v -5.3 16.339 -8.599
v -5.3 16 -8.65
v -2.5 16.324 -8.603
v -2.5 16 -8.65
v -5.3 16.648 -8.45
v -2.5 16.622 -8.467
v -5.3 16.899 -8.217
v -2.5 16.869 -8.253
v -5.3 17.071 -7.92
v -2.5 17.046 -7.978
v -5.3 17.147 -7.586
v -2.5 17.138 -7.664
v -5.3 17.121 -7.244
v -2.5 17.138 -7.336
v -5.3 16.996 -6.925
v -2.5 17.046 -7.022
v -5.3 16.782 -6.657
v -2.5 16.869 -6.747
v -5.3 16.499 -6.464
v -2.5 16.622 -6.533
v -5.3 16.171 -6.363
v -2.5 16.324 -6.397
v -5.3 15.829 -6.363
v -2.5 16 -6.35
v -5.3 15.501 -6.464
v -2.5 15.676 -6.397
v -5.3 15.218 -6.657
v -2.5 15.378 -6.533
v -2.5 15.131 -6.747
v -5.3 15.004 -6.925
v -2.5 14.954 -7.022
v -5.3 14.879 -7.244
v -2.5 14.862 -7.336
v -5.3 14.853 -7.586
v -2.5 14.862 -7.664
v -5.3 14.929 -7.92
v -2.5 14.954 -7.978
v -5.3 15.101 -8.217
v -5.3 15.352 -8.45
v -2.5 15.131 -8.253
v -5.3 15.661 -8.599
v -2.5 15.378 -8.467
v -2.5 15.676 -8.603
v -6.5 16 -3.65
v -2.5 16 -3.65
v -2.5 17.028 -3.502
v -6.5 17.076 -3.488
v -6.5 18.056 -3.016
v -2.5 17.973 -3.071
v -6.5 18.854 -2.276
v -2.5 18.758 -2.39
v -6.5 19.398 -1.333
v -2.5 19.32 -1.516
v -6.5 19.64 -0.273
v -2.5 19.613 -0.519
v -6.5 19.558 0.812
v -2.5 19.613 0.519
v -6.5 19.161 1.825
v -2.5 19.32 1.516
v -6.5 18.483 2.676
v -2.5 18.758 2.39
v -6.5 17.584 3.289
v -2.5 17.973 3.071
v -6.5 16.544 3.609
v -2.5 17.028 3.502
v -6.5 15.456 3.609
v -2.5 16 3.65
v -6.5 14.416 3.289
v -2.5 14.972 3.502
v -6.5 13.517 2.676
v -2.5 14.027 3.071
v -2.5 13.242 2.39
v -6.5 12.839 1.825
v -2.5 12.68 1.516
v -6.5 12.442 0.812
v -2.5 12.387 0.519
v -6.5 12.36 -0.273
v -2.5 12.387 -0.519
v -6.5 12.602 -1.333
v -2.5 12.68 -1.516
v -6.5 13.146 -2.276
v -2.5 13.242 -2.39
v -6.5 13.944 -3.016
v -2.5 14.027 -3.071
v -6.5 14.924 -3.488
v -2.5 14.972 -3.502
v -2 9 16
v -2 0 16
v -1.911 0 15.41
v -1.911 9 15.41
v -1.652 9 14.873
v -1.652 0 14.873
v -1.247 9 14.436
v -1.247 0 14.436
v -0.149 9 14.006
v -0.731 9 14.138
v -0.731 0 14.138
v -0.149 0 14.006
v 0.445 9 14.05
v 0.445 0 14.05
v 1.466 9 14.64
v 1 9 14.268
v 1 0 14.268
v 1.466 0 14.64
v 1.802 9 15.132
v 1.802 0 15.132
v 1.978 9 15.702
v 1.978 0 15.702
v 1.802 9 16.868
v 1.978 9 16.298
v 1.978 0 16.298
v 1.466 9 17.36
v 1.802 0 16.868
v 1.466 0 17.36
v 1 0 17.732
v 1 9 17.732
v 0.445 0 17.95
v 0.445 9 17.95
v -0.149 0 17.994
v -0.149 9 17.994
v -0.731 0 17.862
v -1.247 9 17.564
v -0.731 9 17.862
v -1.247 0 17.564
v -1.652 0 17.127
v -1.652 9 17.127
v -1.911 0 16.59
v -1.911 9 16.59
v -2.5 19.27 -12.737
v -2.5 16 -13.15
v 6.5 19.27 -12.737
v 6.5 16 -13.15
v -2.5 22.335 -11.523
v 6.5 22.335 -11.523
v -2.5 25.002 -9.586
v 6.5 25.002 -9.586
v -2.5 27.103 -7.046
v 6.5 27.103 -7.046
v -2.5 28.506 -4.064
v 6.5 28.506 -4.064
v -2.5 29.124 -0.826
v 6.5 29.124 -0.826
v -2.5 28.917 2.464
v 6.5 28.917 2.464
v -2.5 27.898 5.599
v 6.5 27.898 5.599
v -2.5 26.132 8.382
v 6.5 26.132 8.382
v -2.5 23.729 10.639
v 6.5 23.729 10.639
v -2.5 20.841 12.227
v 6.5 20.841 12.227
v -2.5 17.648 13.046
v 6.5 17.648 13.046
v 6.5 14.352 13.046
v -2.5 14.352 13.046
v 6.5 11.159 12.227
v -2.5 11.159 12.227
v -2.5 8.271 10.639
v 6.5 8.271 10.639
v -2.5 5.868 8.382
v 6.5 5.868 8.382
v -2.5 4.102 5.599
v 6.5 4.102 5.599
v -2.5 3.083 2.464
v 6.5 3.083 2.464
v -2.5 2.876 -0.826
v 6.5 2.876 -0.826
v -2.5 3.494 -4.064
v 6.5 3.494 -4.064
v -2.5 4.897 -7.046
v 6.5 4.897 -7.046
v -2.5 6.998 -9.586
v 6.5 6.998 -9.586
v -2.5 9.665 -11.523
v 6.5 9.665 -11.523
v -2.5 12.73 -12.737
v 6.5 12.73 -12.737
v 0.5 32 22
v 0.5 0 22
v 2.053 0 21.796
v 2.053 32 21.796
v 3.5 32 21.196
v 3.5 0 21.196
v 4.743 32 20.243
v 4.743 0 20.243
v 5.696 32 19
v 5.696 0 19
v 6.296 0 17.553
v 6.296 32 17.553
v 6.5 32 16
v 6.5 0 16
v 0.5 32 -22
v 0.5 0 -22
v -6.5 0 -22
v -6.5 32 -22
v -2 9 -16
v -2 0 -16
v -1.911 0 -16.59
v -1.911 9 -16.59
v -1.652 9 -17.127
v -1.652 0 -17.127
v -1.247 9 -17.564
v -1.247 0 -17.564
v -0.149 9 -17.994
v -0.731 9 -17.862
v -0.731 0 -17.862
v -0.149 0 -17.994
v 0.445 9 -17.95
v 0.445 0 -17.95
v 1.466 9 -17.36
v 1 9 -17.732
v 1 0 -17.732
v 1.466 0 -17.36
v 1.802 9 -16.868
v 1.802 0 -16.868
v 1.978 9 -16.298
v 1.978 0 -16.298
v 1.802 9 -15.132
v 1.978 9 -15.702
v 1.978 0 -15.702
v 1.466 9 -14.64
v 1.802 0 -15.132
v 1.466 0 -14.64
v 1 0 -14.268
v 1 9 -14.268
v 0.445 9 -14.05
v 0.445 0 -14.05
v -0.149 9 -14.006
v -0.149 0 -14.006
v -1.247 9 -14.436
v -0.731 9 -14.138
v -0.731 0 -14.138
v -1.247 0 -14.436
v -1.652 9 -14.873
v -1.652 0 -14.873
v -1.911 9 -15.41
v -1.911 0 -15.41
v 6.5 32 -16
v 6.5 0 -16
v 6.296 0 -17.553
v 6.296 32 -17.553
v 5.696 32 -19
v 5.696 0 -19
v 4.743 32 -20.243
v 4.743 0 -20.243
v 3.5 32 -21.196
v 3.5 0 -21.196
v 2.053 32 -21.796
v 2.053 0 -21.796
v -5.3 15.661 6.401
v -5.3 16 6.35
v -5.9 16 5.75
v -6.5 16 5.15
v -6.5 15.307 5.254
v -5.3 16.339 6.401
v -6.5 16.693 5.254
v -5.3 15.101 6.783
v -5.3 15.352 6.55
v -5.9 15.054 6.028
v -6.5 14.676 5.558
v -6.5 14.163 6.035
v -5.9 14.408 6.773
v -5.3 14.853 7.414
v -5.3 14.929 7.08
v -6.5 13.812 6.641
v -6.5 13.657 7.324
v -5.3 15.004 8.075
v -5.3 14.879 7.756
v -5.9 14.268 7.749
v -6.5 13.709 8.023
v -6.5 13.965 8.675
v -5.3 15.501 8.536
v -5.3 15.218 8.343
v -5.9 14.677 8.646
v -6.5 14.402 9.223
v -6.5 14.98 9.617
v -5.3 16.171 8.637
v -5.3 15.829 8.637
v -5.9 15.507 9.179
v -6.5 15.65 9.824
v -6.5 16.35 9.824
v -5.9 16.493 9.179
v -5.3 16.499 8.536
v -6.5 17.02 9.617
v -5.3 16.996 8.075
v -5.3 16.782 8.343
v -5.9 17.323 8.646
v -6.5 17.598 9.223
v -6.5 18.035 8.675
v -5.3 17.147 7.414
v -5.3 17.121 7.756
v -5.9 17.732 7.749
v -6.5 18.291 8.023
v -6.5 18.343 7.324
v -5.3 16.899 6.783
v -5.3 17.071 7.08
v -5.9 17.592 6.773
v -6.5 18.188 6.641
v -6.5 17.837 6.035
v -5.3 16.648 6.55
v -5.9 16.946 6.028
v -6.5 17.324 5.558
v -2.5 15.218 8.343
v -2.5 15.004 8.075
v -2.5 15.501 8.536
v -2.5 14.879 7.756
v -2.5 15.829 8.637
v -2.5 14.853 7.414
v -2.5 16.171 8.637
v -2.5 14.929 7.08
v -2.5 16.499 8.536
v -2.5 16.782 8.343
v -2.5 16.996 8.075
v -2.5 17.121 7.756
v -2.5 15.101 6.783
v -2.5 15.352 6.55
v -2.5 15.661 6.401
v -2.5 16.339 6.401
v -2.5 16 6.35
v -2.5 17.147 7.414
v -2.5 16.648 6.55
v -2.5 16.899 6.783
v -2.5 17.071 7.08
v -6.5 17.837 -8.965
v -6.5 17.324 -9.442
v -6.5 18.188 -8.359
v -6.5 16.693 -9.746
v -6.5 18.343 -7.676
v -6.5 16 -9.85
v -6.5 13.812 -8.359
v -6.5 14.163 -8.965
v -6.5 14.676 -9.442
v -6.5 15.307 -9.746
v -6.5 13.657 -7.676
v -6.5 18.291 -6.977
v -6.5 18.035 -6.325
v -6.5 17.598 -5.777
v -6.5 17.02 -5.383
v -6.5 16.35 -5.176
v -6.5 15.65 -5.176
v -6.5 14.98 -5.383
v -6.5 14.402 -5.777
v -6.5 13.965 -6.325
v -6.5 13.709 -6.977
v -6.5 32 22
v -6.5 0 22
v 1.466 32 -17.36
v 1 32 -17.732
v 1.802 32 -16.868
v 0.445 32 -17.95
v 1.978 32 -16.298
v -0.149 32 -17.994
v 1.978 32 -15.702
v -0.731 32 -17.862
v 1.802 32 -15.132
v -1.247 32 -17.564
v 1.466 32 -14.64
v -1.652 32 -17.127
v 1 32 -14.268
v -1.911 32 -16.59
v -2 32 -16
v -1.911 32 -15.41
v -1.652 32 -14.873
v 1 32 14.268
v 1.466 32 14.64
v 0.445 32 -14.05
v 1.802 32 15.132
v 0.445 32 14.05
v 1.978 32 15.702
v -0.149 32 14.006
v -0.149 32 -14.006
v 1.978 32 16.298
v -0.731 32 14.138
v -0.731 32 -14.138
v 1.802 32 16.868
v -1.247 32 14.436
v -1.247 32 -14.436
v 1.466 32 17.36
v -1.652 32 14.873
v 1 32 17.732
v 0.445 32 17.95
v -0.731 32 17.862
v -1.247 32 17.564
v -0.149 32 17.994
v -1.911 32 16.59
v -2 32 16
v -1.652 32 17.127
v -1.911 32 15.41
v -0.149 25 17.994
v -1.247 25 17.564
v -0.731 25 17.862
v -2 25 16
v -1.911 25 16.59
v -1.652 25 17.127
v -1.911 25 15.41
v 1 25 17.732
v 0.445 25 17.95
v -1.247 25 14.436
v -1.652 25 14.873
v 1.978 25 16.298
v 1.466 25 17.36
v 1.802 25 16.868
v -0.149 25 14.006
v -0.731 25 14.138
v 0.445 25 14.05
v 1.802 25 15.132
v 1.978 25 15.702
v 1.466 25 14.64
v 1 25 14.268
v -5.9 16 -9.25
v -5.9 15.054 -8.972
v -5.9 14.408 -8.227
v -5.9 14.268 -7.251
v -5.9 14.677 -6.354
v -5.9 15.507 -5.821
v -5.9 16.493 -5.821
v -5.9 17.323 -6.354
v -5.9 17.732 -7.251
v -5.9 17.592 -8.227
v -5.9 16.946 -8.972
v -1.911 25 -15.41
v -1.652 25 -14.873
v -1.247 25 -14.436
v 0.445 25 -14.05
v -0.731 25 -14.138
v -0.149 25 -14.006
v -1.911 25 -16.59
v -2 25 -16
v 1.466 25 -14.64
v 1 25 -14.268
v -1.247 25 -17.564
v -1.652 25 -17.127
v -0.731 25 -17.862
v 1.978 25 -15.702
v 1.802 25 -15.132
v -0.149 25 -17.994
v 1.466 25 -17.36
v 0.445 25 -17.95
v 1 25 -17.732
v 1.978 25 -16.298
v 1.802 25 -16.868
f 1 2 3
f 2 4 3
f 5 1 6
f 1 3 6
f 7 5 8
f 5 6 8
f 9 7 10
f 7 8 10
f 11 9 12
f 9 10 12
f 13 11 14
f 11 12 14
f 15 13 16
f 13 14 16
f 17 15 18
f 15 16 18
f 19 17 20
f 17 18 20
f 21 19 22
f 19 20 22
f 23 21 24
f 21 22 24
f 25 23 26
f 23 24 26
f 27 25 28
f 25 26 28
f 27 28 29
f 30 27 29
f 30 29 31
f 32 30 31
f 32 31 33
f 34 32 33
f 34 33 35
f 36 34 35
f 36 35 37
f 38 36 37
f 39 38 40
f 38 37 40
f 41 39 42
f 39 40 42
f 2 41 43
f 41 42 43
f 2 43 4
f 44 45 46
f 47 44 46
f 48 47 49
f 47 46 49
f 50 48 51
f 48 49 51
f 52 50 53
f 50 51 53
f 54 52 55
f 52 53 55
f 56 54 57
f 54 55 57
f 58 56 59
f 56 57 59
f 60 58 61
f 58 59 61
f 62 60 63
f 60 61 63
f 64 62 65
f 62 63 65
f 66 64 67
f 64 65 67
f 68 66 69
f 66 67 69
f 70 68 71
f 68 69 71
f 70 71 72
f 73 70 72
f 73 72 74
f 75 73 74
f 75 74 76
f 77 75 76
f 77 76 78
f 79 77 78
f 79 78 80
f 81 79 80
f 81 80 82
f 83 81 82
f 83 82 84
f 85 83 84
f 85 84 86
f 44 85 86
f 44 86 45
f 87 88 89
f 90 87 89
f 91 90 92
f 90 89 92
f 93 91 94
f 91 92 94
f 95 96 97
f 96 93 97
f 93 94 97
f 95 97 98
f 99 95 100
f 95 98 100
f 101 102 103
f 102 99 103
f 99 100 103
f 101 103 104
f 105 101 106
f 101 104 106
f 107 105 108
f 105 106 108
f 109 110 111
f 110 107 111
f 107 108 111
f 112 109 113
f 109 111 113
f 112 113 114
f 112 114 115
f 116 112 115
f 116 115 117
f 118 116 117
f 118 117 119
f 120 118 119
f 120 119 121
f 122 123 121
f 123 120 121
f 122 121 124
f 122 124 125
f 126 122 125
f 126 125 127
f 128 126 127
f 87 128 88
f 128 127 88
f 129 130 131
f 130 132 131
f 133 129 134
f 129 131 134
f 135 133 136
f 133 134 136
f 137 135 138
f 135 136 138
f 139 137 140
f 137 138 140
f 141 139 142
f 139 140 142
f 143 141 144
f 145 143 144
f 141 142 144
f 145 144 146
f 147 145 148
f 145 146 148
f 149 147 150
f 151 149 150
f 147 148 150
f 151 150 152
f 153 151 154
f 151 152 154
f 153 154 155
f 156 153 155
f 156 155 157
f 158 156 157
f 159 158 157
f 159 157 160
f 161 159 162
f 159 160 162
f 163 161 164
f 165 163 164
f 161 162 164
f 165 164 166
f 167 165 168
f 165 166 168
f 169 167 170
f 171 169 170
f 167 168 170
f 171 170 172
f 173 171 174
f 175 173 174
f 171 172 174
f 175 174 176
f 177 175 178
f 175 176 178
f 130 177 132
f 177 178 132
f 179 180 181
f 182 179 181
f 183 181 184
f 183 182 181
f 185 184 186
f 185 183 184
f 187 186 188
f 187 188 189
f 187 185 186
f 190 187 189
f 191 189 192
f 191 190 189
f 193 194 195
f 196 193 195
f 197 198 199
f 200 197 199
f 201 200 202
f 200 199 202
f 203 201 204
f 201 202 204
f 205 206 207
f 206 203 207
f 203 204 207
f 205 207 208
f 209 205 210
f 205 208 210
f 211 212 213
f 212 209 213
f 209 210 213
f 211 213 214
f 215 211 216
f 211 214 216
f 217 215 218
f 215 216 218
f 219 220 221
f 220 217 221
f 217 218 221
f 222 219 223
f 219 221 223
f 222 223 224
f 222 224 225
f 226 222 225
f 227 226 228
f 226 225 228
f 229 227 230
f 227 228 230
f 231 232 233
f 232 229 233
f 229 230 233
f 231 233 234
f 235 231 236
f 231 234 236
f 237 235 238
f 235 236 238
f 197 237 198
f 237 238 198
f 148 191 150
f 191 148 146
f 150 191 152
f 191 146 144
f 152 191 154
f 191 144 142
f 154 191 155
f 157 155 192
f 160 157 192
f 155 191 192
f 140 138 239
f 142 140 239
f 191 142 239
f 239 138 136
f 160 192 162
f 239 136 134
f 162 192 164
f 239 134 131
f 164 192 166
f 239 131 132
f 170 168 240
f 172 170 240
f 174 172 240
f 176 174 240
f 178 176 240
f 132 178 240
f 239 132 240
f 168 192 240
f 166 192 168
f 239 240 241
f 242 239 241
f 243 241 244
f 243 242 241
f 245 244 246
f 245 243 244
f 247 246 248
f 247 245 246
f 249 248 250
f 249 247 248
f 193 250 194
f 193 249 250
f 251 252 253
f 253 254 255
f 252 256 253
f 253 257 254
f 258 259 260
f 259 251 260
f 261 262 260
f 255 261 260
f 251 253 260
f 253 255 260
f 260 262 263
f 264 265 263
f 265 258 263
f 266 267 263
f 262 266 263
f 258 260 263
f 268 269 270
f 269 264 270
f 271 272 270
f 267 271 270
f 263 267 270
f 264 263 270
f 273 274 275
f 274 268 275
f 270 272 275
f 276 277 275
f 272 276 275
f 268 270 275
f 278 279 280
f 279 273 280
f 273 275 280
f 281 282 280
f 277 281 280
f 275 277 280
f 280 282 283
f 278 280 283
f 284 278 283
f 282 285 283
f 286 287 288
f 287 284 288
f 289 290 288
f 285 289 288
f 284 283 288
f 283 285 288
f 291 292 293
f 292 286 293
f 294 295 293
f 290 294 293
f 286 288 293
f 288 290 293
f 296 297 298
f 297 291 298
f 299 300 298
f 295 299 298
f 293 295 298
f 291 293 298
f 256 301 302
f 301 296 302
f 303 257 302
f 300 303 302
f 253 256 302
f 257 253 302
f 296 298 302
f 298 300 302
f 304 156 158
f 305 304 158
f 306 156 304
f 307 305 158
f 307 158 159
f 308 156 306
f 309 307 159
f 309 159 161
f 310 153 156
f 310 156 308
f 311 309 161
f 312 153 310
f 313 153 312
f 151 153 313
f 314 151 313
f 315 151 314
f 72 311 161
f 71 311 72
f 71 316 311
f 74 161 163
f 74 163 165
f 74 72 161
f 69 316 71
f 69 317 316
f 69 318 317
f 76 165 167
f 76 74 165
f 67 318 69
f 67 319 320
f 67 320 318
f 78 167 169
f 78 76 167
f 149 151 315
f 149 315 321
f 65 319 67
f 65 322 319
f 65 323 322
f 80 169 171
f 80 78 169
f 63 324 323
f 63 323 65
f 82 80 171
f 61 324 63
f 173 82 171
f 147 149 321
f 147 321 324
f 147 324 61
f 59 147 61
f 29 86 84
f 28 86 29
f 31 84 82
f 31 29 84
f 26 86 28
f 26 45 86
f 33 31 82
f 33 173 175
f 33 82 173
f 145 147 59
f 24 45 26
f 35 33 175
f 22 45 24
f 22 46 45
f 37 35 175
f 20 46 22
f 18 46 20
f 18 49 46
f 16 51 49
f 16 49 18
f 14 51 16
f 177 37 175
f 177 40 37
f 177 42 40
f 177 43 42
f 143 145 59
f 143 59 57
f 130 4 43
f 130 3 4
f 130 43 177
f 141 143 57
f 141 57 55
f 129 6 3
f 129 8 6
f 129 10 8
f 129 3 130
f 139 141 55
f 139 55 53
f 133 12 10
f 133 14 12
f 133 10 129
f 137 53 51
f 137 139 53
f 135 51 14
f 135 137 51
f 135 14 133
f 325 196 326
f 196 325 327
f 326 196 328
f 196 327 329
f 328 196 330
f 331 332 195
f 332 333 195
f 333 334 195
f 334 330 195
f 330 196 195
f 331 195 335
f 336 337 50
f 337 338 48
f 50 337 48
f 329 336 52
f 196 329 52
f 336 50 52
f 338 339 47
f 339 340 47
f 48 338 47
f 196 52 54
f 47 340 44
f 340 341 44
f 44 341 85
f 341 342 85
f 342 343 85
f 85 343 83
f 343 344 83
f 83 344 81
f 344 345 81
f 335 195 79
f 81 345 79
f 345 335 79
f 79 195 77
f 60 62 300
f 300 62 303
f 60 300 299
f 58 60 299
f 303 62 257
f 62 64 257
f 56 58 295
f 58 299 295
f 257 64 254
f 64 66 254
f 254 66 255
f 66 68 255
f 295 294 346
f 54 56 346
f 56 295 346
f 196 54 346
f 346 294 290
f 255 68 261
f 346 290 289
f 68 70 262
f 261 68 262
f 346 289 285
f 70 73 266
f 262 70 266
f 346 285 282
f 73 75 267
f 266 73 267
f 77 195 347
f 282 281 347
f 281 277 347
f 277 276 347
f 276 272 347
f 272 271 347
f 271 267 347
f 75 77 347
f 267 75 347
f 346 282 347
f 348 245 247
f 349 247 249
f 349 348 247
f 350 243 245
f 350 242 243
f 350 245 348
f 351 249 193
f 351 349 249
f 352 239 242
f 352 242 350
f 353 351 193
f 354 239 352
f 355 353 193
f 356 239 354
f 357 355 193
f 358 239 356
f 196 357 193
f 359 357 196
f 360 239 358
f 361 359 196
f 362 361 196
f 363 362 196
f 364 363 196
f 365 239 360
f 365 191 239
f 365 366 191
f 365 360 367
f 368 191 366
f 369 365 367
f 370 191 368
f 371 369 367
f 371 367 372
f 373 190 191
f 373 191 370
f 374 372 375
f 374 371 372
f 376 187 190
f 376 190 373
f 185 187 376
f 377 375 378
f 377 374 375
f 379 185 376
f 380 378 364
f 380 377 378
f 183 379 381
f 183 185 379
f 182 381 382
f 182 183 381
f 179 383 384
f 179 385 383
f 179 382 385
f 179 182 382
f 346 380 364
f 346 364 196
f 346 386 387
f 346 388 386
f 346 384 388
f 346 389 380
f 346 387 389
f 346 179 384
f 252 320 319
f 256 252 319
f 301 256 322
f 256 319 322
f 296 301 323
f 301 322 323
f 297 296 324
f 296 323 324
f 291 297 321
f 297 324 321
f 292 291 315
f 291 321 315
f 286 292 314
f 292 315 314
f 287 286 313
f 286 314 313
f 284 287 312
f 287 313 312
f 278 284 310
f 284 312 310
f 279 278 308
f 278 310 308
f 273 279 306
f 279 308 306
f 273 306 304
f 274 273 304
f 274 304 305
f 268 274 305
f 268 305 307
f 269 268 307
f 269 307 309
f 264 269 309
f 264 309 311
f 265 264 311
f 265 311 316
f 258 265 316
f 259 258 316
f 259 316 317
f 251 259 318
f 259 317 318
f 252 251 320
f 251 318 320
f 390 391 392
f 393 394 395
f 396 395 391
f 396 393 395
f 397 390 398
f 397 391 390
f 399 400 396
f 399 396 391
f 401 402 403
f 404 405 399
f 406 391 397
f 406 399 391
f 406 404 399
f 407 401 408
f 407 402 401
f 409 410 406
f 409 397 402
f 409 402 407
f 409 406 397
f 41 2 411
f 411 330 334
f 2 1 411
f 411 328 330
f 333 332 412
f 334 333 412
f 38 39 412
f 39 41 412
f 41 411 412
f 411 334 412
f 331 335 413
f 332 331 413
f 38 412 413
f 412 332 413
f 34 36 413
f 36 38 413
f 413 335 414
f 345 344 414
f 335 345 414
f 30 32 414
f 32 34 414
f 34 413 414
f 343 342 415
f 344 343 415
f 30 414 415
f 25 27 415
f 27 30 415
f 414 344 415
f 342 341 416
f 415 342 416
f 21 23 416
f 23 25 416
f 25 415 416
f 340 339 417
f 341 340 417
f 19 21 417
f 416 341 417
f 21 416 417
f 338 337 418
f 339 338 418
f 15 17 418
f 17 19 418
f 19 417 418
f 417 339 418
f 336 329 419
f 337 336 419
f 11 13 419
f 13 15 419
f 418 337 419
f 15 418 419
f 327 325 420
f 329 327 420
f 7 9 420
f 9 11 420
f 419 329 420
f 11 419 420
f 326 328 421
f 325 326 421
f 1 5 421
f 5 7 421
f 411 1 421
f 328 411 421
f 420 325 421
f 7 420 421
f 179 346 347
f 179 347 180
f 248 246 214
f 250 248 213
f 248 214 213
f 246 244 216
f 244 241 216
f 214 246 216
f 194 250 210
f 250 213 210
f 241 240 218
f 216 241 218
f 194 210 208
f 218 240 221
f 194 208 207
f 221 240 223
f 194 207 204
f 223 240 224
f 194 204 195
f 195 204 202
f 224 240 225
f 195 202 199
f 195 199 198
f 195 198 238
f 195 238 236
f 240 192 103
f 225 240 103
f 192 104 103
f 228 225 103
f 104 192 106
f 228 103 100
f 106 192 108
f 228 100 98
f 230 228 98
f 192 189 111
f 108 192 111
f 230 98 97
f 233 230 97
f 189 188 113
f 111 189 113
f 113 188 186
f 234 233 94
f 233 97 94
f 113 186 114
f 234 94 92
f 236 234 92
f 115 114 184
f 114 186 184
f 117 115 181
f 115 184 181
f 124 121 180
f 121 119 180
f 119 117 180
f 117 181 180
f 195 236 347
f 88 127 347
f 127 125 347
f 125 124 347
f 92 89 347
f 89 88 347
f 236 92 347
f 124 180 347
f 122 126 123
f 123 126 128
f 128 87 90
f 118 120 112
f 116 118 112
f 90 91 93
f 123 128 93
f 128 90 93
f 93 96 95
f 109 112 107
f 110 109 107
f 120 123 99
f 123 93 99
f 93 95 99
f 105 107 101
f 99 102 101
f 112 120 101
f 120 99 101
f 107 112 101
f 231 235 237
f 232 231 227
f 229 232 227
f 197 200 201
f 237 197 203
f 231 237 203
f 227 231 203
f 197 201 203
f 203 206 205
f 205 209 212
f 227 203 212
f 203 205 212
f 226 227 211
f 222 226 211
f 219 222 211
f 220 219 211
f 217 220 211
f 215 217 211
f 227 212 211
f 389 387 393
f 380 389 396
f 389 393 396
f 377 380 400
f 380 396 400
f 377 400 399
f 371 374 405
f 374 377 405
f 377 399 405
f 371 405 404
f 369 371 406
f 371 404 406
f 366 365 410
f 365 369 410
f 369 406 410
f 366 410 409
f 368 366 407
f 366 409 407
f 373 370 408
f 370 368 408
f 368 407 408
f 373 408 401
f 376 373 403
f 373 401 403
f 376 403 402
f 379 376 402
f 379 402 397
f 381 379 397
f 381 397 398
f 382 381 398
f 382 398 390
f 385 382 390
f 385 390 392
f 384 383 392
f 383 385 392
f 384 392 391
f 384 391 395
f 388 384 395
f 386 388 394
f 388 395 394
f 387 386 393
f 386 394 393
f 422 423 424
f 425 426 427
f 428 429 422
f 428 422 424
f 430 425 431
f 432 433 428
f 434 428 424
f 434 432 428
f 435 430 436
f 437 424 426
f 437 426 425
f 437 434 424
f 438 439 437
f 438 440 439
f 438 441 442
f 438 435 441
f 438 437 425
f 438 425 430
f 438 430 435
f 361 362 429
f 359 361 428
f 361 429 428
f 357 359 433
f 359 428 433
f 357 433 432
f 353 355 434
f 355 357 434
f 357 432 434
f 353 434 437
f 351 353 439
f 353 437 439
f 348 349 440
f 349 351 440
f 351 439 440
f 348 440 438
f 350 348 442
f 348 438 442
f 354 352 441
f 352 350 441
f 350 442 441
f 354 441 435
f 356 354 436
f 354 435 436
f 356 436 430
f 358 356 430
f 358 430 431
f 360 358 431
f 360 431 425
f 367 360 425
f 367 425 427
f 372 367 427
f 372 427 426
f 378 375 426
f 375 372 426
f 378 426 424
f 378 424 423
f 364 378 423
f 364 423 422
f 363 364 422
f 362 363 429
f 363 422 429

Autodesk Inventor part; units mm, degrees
ref_plane "YZ Plane" through (0, 0, 0) normal (1, 0, 0) x (0, 1, 0)
ref_plane "XZ Plane" through (0, 0, 0) normal (0, 1, 0) x (-1, 0, 0)
ref_plane "XY Plane" through (0, 0, 0) normal (0, 0, 1) x (1, 0, 0)
sketch "Эскиз1" plane through (0, 0, 0) normal (0, 1, 0) x (-1, 0, 0)
  line L0 (6.5, 22) -> (-6.5, 22)
  line L1 (-6.5, 22) -> (-6.5, -22)
  line L2 (-6.5, -22) -> (6.5, -22)
  line L3 (6.5, -22) -> (6.5, 22)
  line L4 (-6.5, 22) -> (6.5, -22) construction
  line L5 (0, 22) -> (0, -22) construction
  circle A0 centre (0, 16) radius 2
  line L6 (6.5, 0) -> (-6.5, 0) construction
  circle A1 centre (0, -16) radius 2
  point P0 (0, 0)
  point P1 (0, 0)
  dimension "d0" = 13
  dimension "d1" = 44
  dimension "d2" = 16
  dimension "d3" = 4
extrude "Выдавливание1" add sketch "Эскиз1" along normal blind 32
sketch "Эскиз2" plane through (6.5, 0, 22) normal (1, 0, 0) x (0, 0, -1)
  line L0 (0, 32) -> (44, 32) projected
  line L1 (44, 0) -> (0, 0) projected
  line L2 (44, 32) -> (0, 0) construction
  circle A0 centre (22, 16) radius 10.15
  line L3 (11.85, 16) -> (32.15, 16) construction
  circle A1 centre (14.5, 16) radius 1.15
  circle A2 centre (29.5, 16) radius 1.15
  line L4 (14.5, 16) -> (29.5, 16)
  circle A3 centre (22, 16) radius 13.15
  line L5 (22, 29.15) -> (22, 2.85)
  line L6 (44, 0) -> (44, 32) projected
  circle A4 centre (22, 16) radius 3.65
  point P0 (22, 0)
  dimension "d9" = 20.3
  dimension "d10" = 2.3
  dimension "d11" = 15
  dimension "d17" = 7.3
  dimension "d21" = 26.3
extrude "Выдавливание3" cut sketch "Эскиз2" against normal through all contours A2 | A1 | A4 L4 L5 | L5 L4 A4 | A4 L4 L5 | L5 L4 A4
extrude "Выдавливание4" cut sketch "Эскиз2" against normal blind 9
ref_plane "РабПлоскость1" through (0, 25, 0) normal (0, 1, 0) x (1, 0, 0)
sketch "Эскиз3" plane through (0, 25, 0) normal (0, 1, 0) x (1, 0, 0)
  circle A0 centre (0, -16) radius 2 projected
  circle A1 centre (0, 16) radius 2 projected
  point P0 (0, 0)
extrude "Выдавливание5" add sketch "Эскиз3" against normal blind 16
fillet "Сопряжение1" radius 6 2 edges at (6.5, 16, 22) (6.5, 16, -22)
chamfer "Фаска1" distance 1.2 angle 45 2 edges at (-6.5, 16, -6.35) (-6.5, 16, 8.65)
properties part number "motor_mount_edge"
